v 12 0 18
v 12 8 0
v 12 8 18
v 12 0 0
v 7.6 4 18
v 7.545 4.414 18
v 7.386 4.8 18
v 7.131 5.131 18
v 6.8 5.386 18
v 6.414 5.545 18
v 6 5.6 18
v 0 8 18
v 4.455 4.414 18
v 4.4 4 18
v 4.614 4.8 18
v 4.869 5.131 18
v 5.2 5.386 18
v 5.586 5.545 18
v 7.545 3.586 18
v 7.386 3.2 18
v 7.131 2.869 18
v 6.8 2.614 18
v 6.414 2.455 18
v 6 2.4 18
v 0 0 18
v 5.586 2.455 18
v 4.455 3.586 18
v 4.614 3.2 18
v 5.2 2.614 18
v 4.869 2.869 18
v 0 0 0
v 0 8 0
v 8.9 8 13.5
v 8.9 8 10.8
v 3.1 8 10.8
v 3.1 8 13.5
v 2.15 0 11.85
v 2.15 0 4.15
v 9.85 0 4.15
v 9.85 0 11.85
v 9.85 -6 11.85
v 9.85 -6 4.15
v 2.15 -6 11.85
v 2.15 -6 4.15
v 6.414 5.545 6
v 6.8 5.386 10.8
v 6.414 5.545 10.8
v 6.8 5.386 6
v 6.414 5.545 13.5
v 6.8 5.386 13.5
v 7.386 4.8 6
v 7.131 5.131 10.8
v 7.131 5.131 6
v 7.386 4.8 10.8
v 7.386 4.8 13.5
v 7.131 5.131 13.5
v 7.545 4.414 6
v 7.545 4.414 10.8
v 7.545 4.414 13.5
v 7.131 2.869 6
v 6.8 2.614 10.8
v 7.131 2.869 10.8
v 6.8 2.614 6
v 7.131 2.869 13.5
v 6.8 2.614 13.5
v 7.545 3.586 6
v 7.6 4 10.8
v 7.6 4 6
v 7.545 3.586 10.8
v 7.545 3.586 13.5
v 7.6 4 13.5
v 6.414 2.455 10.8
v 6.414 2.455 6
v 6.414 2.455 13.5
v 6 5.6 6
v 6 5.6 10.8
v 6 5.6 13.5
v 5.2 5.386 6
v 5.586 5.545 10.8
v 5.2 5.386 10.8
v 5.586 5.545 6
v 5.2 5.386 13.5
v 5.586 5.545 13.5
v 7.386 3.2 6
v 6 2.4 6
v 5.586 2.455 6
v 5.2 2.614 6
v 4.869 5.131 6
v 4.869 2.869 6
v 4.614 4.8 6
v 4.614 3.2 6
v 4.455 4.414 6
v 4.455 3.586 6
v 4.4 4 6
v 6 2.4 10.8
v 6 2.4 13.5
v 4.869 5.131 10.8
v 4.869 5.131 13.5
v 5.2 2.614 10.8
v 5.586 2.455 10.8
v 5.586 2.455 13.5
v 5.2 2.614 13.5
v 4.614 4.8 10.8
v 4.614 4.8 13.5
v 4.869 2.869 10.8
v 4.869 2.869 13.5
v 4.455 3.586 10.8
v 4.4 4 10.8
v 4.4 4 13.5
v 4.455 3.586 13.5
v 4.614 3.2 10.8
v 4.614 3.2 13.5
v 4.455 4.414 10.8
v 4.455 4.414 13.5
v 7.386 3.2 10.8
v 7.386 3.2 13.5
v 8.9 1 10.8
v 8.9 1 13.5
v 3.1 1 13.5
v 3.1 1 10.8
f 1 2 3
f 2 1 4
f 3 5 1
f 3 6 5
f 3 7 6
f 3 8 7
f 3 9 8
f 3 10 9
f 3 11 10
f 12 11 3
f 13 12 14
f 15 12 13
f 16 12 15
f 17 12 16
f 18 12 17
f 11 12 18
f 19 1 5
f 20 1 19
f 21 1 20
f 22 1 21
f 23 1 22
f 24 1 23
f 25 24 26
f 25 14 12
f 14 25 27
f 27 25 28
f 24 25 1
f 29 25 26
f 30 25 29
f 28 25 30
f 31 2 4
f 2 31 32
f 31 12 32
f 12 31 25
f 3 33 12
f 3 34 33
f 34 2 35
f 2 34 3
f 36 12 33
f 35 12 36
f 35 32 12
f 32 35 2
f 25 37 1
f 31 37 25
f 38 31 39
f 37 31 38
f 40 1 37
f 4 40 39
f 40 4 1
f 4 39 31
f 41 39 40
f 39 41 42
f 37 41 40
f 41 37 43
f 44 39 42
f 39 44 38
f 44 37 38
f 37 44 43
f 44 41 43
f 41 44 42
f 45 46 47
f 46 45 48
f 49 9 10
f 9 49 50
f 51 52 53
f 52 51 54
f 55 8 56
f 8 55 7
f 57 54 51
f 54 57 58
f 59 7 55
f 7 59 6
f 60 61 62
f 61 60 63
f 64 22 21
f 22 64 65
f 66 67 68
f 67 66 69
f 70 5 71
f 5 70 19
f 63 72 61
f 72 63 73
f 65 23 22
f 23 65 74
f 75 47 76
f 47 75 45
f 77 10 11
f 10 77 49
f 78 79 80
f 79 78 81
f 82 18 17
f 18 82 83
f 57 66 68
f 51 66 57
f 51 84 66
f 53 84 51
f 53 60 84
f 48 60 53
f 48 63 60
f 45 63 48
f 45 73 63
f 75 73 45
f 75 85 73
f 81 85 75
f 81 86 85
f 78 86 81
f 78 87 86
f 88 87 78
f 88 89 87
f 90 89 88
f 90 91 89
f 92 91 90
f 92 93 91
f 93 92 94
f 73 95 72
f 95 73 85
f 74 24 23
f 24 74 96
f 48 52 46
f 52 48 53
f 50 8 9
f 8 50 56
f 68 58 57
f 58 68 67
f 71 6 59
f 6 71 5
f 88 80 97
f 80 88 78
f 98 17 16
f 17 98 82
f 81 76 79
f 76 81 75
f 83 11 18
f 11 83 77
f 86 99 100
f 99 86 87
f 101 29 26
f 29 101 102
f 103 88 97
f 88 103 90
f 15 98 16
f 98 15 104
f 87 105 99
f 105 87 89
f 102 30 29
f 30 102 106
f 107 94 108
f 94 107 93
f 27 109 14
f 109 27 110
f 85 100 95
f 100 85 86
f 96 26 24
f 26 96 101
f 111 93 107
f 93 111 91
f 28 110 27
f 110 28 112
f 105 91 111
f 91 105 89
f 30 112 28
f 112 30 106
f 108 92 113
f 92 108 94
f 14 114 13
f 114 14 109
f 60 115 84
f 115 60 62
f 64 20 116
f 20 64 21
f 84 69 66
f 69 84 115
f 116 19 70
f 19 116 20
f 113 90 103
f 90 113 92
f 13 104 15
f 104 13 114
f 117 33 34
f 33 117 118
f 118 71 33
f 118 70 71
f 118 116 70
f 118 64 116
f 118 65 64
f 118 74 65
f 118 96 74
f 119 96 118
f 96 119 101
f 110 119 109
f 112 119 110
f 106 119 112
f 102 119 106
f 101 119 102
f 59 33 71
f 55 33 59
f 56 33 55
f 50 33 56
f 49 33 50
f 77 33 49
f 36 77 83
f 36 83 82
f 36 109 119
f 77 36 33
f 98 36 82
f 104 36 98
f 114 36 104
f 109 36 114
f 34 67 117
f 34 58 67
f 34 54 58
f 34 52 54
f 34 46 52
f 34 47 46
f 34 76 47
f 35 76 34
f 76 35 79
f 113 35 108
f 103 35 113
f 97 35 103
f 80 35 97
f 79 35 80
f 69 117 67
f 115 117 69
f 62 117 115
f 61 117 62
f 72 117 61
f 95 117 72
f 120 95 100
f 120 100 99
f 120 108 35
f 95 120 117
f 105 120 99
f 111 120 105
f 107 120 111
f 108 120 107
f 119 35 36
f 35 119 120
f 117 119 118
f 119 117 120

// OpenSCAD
// post4.scad -- 3D-printed nut-carrier post for the v4 wooden case.
// PRINT FOUR.  Each post hangs on a front/back wall: its tab drops into a
// through-slot lasered near the wall top, its top face sits flush with the
// wall top (= lid underside), and an M3 nut slides into the slot from the
// post's interior face, where it stays captive (same idea as the hex
// insets in v1/holder15.scad's PCB plates).  An M3 x 14 machine screw
// drives down through the lid into the nut; the nut_roof of plastic above
// the nut carries the pull-out load.  No glue anywhere: the tab locates
// the post, the screw clamps it.
//
// PRINT LYING ON A SIDE (x) FACE: every layer is then the full cross
// section (body + tab), so there are no overhangs and no support; the
// bore and nut slot print as short bridges.
//
// The parameters below MUST MATCH case4.scad (t, Hi, post_*).

t  = 6;       // case sheet thickness (tab reaches through the wall)
Hi = 43 - t;  // case interior height (info only; the post is ph tall)

pl = 12;      // post length along the wall
pd = 8;       // post depth into the case (clears the board footprint in plan)
ph = 18;      // post height; top face lands flush at the wall top

tab_w   = 8;      // wall slot is 8 x 8 (case4 post_tab_w/h)
tab_h   = 8;
tab_fit = 0.15;   // per-side clearance of the printed tab in the slot
tab_z   = ph - 14;   // tab bottom (post-local); slot at case z Hi-14..Hi-6

bore_d = 3.2;     // M3 clearance, down from the top face
bore_l = 12;
nut_w  = 5.8;     // M3 nut: 5.5 across flats + fit
nut_t  = 2.7;     // M3 nut: 2.4 thick + fit
nut_roof = 4.5;       // plastic between top face and nut
nut_slot_deep = 7;    // slide-in depth from the interior (y=pd) face

module post4() {
    difference() {
        union() {
            cube([pl, pd, ph]);                        // wall face at y=0
            translate([(pl-tab_w)/2 + tab_fit, -t, tab_z + tab_fit])
                cube([tab_w - 2*tab_fit, t + 0.01, tab_h - 2*tab_fit]);
        }
        // screw bore
        translate([pl/2, pd/2, ph - bore_l])
            cylinder(h=bore_l + 1, d=bore_d, $fn=24);
        // nut slide-in slot, open at the interior face
        translate([pl/2 - nut_w/2, pd - nut_slot_deep, ph - nut_roof - nut_t])
            cube([nut_w, nut_slot_deep + 1, nut_t]);
    }
}

post4();
